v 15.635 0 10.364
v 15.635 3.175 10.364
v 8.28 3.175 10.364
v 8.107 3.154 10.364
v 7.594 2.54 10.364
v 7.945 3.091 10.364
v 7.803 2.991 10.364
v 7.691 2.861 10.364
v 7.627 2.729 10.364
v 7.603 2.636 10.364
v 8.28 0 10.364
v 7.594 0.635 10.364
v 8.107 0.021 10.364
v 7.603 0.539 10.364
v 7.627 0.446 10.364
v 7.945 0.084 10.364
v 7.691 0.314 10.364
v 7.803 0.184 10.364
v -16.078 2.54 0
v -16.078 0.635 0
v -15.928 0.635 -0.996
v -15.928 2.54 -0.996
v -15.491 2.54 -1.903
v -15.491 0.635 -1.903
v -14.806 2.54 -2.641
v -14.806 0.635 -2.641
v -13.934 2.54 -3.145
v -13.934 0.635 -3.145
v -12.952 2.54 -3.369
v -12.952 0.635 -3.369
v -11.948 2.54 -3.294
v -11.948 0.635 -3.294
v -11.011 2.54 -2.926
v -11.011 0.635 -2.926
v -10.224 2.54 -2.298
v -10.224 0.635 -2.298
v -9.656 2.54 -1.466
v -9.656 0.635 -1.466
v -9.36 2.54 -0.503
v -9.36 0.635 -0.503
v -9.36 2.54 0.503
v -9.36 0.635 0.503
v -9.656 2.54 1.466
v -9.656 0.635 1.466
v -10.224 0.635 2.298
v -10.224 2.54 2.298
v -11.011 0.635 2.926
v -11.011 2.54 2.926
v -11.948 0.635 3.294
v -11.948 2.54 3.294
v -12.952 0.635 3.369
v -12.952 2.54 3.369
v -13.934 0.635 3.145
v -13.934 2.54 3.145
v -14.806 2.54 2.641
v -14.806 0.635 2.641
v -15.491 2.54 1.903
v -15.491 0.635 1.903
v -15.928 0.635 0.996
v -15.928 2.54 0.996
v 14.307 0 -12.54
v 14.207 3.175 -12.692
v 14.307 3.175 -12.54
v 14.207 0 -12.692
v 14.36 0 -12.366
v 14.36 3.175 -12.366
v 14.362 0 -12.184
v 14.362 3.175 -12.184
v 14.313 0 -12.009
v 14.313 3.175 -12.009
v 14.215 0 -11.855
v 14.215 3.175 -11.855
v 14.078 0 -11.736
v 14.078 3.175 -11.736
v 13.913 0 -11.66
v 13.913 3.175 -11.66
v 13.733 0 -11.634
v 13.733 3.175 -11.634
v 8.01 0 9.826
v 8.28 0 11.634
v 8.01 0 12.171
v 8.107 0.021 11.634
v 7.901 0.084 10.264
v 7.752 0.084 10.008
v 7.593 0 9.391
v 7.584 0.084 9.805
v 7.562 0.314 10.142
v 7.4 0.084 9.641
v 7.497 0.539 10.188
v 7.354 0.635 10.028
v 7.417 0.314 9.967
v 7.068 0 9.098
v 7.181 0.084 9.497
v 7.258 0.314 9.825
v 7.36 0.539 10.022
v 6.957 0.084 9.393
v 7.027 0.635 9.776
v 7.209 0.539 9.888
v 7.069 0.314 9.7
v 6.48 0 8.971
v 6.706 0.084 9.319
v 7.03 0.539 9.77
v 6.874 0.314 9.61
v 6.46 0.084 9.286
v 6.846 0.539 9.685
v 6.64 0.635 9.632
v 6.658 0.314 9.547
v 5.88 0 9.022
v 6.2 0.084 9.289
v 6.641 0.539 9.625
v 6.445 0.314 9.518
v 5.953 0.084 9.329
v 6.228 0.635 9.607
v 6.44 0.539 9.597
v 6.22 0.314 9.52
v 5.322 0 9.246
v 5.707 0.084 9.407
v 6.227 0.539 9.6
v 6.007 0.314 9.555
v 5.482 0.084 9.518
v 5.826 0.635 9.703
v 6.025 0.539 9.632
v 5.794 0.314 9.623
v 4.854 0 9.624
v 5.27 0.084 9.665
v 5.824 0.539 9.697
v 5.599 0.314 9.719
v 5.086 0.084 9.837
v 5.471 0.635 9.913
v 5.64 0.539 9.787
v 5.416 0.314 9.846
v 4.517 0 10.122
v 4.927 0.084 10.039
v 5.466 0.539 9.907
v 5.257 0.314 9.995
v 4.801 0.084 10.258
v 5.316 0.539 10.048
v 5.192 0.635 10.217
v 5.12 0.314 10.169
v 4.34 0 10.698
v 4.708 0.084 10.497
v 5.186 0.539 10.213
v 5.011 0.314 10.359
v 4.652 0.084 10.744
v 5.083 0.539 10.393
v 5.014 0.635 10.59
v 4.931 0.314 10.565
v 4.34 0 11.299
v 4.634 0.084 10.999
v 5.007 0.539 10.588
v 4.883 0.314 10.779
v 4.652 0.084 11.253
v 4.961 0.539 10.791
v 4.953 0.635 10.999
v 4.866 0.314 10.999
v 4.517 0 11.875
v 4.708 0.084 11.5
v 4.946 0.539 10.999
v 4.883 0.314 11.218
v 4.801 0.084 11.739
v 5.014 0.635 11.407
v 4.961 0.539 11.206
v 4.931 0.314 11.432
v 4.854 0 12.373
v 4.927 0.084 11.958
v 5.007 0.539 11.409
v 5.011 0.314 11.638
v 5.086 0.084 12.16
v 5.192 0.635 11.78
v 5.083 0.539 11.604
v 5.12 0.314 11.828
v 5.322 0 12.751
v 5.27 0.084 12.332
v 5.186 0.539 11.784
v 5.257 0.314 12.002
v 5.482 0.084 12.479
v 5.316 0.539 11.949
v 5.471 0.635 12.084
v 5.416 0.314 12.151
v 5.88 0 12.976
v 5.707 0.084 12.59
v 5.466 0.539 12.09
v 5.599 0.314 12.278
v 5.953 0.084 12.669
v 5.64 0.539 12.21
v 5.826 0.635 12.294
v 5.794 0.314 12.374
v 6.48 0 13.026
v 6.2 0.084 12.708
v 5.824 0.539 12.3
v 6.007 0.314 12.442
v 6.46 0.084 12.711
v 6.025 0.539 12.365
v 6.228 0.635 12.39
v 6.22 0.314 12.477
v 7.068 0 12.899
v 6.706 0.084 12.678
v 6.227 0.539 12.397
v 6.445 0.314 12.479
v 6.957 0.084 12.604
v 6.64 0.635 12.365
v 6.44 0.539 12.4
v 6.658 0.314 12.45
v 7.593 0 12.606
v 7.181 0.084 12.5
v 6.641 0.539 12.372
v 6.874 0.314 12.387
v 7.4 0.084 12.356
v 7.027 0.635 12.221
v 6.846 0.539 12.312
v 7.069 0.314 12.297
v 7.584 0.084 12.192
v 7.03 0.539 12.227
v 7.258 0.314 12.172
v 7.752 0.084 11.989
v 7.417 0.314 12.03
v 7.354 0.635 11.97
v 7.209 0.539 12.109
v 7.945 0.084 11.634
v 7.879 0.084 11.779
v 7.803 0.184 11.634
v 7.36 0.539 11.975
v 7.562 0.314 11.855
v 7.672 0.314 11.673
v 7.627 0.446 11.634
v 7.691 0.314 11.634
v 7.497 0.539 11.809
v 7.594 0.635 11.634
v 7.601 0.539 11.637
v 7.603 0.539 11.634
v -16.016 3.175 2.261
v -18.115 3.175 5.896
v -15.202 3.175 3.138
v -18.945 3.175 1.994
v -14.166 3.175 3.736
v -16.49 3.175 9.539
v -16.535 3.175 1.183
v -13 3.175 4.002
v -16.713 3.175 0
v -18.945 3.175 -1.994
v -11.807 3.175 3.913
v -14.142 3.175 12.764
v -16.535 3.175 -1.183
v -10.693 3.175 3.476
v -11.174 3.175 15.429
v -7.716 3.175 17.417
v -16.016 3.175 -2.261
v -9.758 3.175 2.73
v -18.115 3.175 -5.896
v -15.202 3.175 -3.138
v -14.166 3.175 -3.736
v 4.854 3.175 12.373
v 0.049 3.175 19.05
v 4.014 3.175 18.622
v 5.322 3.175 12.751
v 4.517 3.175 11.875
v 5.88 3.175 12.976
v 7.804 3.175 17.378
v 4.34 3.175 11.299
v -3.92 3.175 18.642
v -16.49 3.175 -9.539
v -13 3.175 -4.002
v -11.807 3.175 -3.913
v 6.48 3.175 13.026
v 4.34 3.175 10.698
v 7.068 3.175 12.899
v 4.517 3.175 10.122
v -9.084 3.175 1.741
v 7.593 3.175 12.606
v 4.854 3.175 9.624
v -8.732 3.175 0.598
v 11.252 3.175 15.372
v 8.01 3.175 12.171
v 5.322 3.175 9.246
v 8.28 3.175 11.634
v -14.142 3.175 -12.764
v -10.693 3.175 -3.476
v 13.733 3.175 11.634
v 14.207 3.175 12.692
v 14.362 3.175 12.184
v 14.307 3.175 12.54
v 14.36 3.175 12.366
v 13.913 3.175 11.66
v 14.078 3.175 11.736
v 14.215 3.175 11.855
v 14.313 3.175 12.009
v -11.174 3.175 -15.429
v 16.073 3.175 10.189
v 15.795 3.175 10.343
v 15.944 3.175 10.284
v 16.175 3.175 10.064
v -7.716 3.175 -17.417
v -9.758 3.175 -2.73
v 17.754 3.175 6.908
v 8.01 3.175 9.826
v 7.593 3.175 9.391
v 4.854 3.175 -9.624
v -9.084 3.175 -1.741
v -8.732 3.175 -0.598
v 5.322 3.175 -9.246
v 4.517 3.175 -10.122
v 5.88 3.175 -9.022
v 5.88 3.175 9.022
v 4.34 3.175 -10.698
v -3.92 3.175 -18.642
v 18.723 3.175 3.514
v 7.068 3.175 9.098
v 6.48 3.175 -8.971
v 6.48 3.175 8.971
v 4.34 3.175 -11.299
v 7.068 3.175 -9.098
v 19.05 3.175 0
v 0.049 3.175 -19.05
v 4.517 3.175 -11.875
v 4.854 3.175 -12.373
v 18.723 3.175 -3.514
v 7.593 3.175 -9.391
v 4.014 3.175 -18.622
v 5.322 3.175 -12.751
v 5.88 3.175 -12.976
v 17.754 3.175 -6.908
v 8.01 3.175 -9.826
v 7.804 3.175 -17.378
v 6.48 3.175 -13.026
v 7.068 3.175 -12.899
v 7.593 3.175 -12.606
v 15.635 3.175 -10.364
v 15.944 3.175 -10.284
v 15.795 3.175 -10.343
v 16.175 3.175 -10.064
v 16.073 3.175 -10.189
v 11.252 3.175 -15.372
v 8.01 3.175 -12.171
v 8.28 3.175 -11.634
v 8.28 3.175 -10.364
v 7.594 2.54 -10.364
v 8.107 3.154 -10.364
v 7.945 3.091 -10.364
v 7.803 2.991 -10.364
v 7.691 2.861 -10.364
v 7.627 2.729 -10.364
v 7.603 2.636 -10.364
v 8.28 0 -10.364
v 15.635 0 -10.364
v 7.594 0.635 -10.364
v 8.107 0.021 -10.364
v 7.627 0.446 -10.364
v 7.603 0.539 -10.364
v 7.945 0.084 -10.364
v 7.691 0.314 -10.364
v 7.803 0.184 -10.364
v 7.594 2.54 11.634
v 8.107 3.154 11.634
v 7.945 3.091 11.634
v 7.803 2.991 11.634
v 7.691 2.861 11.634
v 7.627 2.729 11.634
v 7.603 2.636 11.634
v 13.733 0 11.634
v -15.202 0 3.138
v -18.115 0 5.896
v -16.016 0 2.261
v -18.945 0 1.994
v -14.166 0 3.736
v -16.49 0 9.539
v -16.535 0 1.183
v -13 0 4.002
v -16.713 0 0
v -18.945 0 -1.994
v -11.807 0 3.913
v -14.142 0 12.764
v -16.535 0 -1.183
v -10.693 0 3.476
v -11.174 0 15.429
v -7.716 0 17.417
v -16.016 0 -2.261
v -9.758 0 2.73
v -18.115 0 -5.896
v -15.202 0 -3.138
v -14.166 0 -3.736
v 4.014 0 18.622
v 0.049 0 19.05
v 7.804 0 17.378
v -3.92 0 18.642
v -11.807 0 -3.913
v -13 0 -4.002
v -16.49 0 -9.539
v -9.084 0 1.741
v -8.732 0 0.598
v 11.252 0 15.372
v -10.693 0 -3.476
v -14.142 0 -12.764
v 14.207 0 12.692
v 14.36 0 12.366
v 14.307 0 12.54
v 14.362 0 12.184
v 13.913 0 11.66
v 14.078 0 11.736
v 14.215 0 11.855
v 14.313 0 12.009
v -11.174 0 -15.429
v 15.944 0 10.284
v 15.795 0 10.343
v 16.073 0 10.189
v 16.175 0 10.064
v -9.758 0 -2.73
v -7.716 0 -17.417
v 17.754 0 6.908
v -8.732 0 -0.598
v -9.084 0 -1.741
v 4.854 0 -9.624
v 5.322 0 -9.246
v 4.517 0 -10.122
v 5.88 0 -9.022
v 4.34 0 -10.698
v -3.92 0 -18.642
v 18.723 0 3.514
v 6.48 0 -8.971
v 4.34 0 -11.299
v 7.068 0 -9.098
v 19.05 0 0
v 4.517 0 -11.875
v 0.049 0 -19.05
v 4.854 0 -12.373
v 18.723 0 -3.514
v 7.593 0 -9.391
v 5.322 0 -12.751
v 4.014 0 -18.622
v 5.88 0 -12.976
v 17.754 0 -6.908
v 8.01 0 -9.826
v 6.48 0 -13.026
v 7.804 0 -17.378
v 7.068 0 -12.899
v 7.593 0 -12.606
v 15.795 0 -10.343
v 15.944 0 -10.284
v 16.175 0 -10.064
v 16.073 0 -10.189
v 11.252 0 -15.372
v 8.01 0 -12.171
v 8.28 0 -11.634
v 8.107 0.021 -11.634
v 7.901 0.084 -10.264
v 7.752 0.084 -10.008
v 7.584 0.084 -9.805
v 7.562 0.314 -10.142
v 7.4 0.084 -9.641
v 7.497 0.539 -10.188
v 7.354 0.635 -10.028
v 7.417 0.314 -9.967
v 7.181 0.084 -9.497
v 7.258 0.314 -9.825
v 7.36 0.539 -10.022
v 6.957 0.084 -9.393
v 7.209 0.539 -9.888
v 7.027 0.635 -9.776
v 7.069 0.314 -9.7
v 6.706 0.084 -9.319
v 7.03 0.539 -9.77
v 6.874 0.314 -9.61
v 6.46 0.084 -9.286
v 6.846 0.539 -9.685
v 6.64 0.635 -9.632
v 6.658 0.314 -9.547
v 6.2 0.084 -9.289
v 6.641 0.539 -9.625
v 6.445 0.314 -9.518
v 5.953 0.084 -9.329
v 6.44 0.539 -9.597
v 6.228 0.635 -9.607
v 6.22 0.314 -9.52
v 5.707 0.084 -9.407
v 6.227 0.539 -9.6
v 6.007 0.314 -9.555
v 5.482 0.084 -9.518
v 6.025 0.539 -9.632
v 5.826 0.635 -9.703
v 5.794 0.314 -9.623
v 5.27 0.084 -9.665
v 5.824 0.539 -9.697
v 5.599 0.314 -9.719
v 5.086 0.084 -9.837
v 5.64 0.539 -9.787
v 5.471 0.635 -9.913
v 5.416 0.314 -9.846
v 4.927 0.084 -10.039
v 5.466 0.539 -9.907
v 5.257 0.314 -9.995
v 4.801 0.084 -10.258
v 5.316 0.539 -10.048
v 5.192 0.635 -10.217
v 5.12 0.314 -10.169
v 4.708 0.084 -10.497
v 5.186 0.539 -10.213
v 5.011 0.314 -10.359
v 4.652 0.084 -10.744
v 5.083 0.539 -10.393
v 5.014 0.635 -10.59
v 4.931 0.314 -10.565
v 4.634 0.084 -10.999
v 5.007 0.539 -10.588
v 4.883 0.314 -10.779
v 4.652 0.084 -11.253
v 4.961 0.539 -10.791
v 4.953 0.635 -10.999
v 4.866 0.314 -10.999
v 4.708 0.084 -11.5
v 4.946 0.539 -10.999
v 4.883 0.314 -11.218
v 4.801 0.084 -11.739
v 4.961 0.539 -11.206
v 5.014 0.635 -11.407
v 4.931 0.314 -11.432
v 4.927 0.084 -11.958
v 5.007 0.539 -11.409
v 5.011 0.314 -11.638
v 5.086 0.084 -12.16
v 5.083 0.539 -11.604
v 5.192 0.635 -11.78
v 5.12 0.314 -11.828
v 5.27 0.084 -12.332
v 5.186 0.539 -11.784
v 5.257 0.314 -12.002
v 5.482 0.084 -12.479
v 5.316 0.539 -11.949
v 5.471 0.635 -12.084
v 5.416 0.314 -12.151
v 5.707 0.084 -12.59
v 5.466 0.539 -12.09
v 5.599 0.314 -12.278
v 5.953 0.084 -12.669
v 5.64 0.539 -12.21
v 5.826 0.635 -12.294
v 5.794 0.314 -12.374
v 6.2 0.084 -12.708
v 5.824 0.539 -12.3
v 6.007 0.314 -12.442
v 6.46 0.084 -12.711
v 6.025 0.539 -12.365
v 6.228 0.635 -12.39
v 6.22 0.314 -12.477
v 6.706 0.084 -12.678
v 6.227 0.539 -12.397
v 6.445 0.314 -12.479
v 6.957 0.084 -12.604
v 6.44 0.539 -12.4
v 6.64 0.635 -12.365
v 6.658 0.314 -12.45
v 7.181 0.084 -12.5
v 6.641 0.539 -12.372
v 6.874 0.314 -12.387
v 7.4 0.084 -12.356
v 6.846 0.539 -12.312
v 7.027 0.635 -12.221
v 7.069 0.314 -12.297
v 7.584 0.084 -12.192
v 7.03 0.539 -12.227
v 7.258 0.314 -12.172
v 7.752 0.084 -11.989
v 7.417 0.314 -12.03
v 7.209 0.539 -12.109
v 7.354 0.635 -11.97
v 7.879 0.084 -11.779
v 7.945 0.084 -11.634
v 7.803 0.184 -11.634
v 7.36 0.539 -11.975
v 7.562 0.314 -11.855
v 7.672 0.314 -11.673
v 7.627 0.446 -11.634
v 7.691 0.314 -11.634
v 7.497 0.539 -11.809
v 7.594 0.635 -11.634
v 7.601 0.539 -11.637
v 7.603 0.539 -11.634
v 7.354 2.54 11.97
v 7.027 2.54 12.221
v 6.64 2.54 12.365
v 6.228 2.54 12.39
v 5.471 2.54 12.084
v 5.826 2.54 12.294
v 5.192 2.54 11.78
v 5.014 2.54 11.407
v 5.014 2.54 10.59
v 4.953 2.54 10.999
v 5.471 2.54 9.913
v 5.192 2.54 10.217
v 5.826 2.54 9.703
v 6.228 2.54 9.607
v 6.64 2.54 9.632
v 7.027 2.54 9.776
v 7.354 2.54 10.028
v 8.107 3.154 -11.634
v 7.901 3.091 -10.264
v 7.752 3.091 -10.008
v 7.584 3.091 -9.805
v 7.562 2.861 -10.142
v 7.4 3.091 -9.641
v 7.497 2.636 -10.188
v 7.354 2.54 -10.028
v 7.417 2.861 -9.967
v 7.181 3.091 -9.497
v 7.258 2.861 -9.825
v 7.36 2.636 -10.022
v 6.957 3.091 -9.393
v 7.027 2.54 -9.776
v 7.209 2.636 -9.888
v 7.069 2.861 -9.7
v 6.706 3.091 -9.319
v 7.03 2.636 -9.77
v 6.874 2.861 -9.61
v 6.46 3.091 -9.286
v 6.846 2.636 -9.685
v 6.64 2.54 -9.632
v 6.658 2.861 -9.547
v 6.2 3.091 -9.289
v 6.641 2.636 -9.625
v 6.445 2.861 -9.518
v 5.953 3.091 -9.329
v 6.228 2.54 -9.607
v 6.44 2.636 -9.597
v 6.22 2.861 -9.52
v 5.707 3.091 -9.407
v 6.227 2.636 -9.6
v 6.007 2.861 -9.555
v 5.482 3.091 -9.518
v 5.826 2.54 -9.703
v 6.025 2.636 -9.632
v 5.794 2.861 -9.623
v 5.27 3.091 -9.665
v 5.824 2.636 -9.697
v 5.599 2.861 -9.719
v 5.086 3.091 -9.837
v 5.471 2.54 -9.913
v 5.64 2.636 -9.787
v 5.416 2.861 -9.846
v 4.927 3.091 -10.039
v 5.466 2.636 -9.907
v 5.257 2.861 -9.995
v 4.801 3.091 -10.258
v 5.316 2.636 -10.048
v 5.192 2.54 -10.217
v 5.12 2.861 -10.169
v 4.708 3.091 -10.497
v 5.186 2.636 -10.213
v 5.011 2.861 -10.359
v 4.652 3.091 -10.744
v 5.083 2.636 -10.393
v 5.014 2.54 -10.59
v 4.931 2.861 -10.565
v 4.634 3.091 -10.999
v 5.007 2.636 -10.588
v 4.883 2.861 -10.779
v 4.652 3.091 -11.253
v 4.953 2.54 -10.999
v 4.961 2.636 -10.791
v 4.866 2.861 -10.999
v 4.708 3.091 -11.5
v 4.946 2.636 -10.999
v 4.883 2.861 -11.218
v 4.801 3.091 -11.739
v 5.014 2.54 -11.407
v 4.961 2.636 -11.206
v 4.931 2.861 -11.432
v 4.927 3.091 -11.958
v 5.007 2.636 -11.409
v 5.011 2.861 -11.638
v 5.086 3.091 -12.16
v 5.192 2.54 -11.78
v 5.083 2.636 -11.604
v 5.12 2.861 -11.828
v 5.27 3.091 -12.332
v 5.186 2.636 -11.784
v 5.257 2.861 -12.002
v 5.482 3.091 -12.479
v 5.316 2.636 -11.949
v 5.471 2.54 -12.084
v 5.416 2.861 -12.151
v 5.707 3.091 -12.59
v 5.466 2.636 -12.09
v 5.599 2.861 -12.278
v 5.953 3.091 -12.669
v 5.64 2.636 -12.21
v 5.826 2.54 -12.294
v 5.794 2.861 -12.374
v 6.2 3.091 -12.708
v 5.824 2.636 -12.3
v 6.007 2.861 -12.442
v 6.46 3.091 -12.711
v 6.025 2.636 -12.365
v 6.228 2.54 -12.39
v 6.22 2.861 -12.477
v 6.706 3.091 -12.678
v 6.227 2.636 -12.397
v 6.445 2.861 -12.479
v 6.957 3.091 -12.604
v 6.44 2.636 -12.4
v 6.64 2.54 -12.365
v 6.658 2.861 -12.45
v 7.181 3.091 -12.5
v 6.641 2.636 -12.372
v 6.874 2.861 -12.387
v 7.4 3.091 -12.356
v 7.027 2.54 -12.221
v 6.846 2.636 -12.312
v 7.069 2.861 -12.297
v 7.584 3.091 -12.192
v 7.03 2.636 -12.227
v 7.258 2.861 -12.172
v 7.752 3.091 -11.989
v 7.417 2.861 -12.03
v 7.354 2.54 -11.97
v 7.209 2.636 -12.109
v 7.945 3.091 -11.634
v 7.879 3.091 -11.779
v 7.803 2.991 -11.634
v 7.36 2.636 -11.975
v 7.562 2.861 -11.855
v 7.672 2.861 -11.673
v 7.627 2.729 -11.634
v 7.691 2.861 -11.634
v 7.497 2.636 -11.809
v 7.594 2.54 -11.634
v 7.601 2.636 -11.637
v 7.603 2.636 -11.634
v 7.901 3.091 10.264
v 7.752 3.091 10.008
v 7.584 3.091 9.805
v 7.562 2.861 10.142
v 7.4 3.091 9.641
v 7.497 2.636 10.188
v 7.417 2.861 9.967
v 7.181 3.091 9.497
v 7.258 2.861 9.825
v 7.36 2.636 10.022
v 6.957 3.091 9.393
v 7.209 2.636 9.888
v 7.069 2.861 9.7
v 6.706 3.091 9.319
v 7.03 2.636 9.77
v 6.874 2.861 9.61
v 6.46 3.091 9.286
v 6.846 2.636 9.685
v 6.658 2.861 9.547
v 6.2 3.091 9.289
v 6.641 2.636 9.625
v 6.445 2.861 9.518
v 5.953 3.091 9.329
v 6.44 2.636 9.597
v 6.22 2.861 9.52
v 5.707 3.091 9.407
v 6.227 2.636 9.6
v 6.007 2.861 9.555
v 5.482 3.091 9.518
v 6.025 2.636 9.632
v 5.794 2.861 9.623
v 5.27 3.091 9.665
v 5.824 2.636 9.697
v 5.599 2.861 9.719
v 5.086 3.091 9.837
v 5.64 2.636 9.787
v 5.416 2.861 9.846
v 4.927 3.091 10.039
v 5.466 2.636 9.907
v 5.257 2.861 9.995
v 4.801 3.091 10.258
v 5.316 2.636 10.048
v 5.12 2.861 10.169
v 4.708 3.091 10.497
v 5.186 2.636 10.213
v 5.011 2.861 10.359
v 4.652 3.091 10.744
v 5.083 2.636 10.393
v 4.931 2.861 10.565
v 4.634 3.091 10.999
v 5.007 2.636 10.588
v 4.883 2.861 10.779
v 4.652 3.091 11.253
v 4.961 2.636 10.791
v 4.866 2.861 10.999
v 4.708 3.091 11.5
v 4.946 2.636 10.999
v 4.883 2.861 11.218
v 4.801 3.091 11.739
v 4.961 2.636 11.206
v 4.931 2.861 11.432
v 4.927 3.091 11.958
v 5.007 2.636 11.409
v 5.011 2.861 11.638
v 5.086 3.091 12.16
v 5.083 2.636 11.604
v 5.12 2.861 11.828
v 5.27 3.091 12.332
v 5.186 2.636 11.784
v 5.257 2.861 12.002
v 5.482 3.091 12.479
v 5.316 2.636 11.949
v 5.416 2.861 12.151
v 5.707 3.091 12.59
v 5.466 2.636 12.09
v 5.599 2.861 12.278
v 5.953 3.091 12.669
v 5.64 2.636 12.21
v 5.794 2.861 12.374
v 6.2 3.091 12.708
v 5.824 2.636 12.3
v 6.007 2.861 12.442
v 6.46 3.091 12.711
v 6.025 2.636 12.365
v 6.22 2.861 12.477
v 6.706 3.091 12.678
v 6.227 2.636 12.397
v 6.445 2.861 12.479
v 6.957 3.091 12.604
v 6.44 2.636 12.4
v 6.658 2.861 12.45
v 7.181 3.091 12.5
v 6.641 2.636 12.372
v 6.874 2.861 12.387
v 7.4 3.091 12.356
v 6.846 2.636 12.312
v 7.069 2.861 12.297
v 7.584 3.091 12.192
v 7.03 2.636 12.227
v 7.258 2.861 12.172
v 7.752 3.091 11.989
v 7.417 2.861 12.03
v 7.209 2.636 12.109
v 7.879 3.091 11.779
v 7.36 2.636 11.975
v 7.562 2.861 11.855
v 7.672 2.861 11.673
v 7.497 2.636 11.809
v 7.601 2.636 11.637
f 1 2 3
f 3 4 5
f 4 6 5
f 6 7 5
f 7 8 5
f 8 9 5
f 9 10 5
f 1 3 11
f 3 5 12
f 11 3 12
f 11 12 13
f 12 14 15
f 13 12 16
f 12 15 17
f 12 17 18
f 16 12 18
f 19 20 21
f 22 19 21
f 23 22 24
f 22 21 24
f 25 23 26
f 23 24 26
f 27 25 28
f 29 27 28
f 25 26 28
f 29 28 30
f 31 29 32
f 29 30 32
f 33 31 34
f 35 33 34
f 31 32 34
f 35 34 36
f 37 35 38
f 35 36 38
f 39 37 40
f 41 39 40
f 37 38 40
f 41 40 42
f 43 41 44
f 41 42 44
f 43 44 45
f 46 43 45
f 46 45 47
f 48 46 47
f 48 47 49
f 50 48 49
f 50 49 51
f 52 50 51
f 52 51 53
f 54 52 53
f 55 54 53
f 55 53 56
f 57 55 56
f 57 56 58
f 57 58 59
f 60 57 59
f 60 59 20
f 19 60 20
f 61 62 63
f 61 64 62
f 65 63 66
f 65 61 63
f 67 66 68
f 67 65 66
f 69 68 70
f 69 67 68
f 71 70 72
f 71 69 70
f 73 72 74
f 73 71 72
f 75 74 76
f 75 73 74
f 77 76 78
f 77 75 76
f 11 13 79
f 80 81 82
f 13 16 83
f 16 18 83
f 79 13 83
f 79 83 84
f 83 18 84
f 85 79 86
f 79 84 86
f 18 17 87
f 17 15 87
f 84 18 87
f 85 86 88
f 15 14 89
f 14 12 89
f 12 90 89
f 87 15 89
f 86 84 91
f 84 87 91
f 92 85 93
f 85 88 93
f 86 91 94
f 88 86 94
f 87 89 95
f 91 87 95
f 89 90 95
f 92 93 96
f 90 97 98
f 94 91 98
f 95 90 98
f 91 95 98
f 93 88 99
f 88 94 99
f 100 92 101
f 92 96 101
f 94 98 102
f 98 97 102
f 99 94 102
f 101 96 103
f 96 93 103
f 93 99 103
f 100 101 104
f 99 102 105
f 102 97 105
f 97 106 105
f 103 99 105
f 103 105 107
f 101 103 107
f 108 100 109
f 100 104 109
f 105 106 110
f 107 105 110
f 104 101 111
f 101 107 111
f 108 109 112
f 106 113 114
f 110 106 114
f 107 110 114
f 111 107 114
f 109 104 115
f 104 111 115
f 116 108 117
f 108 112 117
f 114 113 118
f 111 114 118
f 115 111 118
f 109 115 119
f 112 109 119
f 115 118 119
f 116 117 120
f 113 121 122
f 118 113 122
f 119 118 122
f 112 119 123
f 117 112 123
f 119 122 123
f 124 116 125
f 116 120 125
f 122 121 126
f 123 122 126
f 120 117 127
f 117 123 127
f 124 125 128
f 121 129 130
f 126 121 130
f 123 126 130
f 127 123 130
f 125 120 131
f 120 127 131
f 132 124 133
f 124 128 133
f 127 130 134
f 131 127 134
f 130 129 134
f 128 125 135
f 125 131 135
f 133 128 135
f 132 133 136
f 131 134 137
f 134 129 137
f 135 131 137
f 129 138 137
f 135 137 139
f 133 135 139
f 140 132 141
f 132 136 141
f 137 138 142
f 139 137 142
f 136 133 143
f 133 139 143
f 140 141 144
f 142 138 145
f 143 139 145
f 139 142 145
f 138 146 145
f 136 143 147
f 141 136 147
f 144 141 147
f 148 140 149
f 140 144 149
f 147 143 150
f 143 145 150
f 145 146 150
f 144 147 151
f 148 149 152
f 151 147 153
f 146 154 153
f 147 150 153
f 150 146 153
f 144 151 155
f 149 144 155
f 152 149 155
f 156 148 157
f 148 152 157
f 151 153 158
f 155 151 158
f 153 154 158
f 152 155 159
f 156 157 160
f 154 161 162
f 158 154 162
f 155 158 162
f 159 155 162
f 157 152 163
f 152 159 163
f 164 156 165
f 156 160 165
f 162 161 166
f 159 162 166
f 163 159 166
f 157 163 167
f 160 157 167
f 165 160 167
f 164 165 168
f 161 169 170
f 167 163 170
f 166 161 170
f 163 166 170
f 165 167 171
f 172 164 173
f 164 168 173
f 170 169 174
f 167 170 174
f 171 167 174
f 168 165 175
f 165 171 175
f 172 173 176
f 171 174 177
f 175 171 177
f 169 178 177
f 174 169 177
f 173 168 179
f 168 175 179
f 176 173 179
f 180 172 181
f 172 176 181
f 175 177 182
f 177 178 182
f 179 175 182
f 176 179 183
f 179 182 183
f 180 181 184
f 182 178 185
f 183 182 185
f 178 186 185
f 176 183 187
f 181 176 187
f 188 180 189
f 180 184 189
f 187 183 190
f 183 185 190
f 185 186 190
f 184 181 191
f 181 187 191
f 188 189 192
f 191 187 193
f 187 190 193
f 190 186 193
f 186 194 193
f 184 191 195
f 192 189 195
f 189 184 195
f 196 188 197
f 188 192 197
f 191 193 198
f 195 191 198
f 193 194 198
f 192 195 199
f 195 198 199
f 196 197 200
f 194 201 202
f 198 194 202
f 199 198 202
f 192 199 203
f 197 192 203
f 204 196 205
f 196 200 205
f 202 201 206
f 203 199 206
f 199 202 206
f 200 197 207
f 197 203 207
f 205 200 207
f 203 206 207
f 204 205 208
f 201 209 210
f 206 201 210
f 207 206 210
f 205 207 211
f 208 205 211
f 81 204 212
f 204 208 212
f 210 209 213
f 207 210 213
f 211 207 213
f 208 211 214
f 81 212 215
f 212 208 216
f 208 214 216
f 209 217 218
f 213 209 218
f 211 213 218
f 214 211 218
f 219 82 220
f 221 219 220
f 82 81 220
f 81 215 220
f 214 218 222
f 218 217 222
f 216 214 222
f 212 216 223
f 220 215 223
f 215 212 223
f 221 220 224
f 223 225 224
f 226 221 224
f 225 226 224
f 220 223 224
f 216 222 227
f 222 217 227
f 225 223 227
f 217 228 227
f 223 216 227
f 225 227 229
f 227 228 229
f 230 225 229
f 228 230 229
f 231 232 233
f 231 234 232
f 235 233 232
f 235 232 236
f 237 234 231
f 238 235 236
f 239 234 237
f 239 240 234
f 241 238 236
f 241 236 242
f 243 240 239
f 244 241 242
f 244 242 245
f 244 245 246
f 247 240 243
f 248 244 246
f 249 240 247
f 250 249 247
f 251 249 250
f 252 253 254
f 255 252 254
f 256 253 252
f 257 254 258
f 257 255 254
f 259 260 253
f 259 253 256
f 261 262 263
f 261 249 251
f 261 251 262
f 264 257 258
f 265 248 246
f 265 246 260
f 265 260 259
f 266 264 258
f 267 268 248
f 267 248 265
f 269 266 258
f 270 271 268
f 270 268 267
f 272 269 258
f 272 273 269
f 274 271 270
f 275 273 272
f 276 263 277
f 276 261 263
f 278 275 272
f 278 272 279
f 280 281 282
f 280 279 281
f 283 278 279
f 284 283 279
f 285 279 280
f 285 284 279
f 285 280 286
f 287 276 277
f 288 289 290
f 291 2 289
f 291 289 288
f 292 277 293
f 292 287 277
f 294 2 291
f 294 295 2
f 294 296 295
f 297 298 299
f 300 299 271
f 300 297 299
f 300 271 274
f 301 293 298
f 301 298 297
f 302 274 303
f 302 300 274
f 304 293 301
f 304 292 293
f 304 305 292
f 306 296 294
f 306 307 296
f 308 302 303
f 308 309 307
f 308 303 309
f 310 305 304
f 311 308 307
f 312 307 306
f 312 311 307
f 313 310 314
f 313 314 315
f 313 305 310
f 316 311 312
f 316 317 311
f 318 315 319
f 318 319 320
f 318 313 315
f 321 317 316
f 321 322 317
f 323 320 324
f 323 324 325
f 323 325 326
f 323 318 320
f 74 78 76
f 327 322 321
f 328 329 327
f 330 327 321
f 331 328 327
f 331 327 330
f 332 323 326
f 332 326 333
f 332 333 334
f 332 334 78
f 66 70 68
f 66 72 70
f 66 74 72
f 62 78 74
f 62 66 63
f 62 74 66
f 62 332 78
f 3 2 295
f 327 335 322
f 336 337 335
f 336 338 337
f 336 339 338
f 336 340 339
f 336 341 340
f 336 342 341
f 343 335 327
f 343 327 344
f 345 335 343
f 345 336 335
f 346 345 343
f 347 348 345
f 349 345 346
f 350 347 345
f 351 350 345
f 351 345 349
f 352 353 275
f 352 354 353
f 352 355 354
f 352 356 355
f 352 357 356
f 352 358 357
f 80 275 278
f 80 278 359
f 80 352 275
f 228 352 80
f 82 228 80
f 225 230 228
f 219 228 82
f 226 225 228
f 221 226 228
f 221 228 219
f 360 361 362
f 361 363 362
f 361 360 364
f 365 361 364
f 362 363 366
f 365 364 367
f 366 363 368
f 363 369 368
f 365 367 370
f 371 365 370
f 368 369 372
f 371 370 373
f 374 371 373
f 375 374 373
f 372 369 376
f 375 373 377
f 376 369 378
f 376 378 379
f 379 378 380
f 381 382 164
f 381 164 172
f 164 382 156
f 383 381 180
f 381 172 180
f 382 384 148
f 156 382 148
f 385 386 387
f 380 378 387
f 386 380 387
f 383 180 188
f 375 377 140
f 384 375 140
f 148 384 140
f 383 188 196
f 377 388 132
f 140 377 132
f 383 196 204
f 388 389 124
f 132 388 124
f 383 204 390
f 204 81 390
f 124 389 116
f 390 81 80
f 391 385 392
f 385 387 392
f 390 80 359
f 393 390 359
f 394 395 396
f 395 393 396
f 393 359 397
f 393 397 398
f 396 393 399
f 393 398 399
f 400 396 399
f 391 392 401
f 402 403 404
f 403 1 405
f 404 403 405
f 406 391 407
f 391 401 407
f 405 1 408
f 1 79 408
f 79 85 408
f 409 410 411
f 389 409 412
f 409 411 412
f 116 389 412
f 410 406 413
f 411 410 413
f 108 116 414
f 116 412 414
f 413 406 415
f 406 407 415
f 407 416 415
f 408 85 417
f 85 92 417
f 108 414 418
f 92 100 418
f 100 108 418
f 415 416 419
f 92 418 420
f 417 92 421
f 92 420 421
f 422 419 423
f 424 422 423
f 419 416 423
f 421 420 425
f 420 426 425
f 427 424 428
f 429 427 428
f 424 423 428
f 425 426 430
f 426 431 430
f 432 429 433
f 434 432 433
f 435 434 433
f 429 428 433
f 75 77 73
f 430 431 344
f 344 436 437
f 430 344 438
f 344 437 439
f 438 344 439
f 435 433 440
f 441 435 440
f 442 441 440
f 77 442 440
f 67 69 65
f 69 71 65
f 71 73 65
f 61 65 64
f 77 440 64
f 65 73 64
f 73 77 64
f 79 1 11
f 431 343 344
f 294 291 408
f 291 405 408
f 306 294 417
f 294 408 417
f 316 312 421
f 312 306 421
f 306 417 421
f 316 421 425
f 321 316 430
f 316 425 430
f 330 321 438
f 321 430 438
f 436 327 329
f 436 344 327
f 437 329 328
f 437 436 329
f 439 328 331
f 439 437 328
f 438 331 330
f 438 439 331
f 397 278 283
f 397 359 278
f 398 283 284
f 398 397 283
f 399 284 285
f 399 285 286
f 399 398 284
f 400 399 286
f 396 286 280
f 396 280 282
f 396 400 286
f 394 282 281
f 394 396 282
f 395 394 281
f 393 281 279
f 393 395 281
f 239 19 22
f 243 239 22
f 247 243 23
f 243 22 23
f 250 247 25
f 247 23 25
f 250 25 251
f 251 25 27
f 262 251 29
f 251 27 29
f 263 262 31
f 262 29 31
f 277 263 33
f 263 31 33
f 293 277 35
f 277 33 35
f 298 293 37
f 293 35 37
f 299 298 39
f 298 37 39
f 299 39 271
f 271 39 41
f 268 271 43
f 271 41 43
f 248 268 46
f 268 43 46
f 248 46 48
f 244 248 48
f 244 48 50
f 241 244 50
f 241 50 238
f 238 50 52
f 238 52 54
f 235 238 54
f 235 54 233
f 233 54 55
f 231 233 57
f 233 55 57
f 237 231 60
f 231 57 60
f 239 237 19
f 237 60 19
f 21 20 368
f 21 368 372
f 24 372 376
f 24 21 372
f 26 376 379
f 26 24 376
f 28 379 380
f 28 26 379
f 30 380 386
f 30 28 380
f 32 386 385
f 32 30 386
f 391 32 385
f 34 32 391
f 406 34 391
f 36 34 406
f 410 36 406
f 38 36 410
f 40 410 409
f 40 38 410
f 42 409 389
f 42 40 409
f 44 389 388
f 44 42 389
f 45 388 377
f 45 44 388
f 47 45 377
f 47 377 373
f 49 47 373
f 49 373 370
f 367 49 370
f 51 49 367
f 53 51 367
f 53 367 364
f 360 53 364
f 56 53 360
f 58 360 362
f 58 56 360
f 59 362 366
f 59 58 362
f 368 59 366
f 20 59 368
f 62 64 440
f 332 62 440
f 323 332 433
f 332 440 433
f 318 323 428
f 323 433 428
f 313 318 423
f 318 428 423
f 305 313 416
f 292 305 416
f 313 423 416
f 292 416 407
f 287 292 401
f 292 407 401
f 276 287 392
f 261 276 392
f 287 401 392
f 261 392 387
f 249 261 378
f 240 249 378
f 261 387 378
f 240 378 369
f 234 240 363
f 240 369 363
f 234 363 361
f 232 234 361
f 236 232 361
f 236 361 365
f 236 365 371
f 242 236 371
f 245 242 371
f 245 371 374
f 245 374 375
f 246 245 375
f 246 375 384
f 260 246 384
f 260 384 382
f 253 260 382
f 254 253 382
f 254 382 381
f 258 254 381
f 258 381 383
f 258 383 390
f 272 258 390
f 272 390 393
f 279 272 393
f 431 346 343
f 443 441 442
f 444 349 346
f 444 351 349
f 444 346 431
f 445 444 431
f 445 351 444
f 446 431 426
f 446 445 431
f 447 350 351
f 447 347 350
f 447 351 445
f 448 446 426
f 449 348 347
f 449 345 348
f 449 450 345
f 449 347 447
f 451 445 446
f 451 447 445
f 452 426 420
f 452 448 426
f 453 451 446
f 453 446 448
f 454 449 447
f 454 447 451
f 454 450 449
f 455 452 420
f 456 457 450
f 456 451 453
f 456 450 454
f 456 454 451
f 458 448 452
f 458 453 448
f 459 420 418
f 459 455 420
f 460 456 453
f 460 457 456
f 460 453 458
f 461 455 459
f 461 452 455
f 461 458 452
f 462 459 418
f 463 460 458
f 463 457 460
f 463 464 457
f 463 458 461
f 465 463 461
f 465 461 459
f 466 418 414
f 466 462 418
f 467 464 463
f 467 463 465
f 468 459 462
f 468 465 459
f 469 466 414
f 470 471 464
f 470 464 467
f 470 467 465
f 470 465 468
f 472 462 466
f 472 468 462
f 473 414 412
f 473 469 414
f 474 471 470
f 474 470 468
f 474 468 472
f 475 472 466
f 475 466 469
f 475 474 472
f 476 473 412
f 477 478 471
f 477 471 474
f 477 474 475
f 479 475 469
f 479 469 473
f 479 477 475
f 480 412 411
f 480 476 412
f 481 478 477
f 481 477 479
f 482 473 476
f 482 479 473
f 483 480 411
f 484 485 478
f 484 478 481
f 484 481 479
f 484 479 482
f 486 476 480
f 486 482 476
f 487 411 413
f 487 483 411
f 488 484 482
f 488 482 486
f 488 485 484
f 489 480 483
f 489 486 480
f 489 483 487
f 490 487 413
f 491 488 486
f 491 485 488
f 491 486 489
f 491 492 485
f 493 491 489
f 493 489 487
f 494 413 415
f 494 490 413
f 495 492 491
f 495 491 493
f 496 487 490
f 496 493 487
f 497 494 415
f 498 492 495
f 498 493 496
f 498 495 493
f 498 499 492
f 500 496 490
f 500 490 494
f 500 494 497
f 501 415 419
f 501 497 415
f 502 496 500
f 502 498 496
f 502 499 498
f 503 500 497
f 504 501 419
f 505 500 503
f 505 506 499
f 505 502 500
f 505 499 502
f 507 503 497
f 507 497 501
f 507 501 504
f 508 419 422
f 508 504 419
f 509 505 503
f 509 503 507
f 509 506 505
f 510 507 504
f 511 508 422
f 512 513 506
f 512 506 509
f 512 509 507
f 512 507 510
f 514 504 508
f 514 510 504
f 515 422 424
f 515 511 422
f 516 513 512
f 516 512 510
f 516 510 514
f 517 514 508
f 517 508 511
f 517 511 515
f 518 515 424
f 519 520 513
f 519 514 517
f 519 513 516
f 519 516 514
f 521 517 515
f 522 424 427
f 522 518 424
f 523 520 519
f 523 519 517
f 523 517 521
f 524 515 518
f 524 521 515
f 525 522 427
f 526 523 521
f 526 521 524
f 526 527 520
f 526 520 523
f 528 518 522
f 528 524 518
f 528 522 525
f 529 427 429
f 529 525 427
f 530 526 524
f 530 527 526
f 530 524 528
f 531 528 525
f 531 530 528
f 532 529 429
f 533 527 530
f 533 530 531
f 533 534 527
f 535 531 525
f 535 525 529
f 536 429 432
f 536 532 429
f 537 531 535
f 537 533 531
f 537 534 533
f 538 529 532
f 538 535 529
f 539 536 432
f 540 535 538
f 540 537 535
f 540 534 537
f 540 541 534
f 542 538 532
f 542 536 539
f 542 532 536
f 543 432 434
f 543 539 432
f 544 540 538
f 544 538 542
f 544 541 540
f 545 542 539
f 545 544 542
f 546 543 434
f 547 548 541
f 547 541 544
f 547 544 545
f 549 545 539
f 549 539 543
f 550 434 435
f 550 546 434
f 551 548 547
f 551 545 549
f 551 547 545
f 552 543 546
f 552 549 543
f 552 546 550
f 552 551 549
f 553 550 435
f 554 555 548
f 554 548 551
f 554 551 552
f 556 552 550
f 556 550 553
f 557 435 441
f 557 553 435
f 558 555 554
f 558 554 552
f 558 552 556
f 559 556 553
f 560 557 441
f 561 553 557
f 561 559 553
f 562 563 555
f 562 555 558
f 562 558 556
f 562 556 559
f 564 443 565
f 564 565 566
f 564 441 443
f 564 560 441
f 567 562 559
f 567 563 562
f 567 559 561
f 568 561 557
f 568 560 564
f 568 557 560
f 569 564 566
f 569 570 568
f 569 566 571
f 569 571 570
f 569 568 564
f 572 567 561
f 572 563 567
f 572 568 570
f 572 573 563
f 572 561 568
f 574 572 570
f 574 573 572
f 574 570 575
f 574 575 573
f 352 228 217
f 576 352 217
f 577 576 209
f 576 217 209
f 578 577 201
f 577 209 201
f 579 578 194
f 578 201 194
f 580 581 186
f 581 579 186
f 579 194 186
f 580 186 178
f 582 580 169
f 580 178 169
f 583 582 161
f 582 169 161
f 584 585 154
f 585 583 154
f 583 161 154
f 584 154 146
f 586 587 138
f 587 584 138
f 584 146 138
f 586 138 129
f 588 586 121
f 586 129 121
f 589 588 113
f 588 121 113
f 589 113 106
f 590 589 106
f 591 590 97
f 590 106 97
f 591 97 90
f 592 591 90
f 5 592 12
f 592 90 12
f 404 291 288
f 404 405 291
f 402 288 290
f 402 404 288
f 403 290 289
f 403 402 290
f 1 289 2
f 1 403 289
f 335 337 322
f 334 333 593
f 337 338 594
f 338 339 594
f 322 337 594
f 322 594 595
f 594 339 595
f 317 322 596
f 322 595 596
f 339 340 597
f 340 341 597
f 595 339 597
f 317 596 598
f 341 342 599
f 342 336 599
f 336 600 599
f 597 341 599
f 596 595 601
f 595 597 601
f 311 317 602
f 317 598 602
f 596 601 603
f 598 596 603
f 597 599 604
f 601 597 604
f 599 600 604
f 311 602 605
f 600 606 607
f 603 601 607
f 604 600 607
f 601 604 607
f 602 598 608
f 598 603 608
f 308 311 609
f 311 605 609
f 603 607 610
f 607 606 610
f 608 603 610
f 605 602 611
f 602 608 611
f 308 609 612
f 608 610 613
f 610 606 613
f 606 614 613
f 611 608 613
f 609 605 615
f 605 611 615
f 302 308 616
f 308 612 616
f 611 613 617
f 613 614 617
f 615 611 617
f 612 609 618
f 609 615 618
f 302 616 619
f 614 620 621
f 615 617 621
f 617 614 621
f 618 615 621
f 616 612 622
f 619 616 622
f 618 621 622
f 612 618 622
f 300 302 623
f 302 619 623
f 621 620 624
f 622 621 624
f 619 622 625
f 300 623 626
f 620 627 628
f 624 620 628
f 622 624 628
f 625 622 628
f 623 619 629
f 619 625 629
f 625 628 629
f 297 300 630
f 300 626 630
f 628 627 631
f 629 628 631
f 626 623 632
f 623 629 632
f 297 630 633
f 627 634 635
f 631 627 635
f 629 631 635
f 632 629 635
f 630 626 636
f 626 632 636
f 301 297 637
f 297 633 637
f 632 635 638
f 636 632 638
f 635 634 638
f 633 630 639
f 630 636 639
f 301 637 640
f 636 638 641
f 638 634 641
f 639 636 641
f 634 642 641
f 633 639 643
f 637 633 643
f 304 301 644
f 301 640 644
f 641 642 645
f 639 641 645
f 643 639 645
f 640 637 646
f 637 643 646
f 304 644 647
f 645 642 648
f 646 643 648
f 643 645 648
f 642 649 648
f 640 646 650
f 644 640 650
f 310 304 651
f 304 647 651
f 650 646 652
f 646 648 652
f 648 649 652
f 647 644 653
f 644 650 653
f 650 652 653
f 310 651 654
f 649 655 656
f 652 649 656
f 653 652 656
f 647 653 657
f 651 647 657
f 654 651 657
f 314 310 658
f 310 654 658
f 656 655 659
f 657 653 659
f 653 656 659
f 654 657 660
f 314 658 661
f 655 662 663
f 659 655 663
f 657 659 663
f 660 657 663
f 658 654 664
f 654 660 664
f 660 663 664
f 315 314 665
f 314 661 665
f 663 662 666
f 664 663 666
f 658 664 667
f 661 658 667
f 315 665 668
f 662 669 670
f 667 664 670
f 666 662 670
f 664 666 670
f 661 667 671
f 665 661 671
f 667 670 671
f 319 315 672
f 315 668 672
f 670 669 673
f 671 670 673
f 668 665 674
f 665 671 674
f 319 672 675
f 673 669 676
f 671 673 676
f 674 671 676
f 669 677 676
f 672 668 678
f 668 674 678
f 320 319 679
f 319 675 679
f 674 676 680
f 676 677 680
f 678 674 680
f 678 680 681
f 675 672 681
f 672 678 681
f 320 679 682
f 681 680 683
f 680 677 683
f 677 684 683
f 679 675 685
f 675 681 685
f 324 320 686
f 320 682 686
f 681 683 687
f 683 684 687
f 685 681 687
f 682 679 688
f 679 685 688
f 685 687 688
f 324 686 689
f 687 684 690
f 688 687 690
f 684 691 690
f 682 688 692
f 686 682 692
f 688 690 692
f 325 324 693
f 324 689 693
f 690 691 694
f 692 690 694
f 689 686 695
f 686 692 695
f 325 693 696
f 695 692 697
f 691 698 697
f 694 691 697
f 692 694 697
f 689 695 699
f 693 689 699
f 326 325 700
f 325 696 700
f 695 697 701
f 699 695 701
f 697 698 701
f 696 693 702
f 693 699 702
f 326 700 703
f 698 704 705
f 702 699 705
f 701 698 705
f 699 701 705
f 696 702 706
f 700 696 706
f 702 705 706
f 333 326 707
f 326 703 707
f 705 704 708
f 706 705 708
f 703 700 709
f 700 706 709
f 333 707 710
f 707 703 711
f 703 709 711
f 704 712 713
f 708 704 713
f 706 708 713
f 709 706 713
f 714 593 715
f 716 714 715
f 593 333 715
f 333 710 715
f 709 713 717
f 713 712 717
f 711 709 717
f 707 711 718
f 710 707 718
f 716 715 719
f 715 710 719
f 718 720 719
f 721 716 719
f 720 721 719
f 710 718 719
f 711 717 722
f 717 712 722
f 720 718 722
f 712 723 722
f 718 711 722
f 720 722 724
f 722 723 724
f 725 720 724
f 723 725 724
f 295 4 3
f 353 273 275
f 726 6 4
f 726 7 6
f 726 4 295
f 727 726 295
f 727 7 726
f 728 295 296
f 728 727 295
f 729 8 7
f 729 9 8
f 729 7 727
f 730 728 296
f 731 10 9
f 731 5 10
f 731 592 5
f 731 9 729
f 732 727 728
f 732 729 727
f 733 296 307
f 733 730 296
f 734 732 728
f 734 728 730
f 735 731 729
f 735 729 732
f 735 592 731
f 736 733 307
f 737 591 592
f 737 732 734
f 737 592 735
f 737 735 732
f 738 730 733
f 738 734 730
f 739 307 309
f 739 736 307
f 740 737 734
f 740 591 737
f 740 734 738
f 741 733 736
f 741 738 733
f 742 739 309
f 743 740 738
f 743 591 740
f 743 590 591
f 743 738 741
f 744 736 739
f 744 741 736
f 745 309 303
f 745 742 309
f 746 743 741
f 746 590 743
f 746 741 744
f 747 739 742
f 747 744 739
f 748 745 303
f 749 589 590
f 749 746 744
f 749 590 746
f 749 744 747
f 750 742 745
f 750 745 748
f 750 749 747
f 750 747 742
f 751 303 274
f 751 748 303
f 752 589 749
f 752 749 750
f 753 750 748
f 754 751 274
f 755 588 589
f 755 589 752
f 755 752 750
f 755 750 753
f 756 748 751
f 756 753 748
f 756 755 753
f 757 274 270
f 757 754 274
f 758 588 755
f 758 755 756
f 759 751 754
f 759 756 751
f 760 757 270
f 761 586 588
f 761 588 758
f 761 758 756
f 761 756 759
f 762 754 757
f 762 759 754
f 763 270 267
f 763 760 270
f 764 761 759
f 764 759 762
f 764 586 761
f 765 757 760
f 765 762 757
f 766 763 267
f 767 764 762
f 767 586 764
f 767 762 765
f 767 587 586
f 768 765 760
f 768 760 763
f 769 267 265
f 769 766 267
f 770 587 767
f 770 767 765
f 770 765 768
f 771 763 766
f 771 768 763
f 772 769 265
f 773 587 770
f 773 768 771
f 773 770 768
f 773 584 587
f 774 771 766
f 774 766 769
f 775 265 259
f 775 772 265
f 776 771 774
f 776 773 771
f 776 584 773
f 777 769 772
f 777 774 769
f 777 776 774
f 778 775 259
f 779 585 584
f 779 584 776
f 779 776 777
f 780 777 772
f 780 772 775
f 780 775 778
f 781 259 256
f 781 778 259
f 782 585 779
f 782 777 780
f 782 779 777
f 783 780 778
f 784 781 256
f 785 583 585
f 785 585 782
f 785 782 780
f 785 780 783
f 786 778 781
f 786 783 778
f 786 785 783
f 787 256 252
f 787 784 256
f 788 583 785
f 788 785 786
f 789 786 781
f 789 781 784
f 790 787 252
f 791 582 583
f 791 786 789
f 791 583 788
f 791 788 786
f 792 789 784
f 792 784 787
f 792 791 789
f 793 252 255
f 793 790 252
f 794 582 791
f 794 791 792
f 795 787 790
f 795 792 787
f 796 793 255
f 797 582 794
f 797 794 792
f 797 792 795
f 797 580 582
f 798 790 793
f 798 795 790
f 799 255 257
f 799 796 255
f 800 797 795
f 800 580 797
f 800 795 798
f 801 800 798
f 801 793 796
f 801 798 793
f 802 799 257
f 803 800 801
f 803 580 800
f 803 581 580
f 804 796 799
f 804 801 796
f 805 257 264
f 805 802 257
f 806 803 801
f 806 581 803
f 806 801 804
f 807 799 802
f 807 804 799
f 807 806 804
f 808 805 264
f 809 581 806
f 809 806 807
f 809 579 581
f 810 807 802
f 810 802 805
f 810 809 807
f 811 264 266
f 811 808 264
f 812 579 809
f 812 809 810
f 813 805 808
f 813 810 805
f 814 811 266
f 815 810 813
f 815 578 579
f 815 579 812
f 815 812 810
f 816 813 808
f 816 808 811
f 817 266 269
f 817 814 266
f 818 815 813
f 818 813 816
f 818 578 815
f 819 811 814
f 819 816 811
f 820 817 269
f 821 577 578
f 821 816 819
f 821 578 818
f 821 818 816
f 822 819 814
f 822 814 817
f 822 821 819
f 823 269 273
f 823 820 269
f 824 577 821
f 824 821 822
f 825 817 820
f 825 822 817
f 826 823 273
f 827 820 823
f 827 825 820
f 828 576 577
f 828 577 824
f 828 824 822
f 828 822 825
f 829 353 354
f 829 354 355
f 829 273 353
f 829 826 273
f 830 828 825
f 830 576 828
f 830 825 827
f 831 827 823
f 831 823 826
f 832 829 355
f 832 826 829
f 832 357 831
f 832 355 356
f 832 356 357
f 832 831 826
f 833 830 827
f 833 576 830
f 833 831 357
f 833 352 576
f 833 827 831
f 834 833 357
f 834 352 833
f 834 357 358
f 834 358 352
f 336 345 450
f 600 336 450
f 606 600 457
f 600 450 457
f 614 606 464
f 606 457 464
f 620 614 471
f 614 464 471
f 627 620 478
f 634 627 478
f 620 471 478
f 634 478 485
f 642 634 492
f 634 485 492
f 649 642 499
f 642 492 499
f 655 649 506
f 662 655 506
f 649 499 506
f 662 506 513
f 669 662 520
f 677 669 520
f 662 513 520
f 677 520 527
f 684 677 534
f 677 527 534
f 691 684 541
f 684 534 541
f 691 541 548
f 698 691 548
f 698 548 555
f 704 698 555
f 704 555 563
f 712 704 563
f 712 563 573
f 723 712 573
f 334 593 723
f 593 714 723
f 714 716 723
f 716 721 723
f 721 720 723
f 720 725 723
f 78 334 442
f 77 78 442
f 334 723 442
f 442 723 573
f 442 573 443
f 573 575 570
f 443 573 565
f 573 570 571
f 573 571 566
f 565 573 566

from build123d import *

# Parameters (mm, degrees)
SKETCH1_R             = 19.05
BOSS_EXTRUDE1_DEPTH   = 3.175
TIEDOWN_HOLE_D        = 6.7564
MONOFILAMENT_HOLE_D   = 2.794
MONOFILAMENT_HOLE_2_D = 2.794
CHAMFER1_SIZE         = 0.635
SKETCH10_W            = 1.27
SKETCH10_H            = 12.7
CUT_EXTRUDE1_DEPTH    = 13.7
FILLET1_R             = 0.635


with BuildPart() as part:
    # Sketch1 → Boss-Extrude1 (new body)
    with BuildSketch(Plane(origin=(0, 0, 0), x_dir=(1, 0, 0), z_dir=(0, 1, 0))):
        Circle(SKETCH1_R)
    extrude(amount=BOSS_EXTRUDE1_DEPTH)

    # Tiedown Hole (through all)
    with Locations(Plane(origin=(0, 3.175, 0), x_dir=(1, 0, 0), z_dir=(0, 1, 0))):
        with Locations((-12.7, 0)):
            Hole(TIEDOWN_HOLE_D / 2)

    # Monofilament Hole (through all)
    with Locations(Plane(origin=(0, 3.175, 0), x_dir=(-1, 0, 0), z_dir=(0, 1, 0))):
        with Locations((-6.35, -10.998522628)):
            Hole(MONOFILAMENT_HOLE_D / 2)

    # Monofilament Hole 2 (through all)
    with Locations(Plane(origin=(0, 3.175, 0), x_dir=(1, 0, 0), z_dir=(0, 1, 0))):
        with Locations((6.35, -10.998522628)):
            Hole(MONOFILAMENT_HOLE_2_D / 2)

    # Chamfer1
    chamfer1_edges = [part.edges().sort_by_distance(p)[0] for p in [
        (-9.3218, 3.175, 0),
        (-9.3218, 0, 0),
    ]]
    chamfer(chamfer1_edges, length=CHAMFER1_SIZE)

    # Sketch10 → Cut-Extrude1 (cut, through all)
    with BuildSketch(Plane(origin=(6.35, 6.35, 0), x_dir=(0, 0, 1), z_dir=(1, 0, 0))):
        with Locations((10.998522628, 3.175)):
            Rectangle(SKETCH10_W, SKETCH10_H)
        with Locations((-10.998522628, 3.175)):
            Rectangle(SKETCH10_W, SKETCH10_H)
    extrude(amount=CUT_EXTRUDE1_DEPTH, mode=Mode.SUBTRACT)

    # Fillet1
    fillet1_edges = [part.edges().sort_by_distance(p)[0] for p in [
        (4.953, 0, 10.998522628),
        (4.953, 3.175, 10.998522628),
        (4.953, 0, -10.998522628),
        (4.953, 3.175, -10.998522628),
        (15.984364196, 1.5875, 10.363522628),
        (15.085213, 1.5875, 11.633522628),
        (15.984364196, 1.5875, -10.363522628),
        (15.085213, 1.5875, -11.633522628),
    ]]
    fillet(fillet1_edges, radius=FILLET1_R)


solid = part.part
